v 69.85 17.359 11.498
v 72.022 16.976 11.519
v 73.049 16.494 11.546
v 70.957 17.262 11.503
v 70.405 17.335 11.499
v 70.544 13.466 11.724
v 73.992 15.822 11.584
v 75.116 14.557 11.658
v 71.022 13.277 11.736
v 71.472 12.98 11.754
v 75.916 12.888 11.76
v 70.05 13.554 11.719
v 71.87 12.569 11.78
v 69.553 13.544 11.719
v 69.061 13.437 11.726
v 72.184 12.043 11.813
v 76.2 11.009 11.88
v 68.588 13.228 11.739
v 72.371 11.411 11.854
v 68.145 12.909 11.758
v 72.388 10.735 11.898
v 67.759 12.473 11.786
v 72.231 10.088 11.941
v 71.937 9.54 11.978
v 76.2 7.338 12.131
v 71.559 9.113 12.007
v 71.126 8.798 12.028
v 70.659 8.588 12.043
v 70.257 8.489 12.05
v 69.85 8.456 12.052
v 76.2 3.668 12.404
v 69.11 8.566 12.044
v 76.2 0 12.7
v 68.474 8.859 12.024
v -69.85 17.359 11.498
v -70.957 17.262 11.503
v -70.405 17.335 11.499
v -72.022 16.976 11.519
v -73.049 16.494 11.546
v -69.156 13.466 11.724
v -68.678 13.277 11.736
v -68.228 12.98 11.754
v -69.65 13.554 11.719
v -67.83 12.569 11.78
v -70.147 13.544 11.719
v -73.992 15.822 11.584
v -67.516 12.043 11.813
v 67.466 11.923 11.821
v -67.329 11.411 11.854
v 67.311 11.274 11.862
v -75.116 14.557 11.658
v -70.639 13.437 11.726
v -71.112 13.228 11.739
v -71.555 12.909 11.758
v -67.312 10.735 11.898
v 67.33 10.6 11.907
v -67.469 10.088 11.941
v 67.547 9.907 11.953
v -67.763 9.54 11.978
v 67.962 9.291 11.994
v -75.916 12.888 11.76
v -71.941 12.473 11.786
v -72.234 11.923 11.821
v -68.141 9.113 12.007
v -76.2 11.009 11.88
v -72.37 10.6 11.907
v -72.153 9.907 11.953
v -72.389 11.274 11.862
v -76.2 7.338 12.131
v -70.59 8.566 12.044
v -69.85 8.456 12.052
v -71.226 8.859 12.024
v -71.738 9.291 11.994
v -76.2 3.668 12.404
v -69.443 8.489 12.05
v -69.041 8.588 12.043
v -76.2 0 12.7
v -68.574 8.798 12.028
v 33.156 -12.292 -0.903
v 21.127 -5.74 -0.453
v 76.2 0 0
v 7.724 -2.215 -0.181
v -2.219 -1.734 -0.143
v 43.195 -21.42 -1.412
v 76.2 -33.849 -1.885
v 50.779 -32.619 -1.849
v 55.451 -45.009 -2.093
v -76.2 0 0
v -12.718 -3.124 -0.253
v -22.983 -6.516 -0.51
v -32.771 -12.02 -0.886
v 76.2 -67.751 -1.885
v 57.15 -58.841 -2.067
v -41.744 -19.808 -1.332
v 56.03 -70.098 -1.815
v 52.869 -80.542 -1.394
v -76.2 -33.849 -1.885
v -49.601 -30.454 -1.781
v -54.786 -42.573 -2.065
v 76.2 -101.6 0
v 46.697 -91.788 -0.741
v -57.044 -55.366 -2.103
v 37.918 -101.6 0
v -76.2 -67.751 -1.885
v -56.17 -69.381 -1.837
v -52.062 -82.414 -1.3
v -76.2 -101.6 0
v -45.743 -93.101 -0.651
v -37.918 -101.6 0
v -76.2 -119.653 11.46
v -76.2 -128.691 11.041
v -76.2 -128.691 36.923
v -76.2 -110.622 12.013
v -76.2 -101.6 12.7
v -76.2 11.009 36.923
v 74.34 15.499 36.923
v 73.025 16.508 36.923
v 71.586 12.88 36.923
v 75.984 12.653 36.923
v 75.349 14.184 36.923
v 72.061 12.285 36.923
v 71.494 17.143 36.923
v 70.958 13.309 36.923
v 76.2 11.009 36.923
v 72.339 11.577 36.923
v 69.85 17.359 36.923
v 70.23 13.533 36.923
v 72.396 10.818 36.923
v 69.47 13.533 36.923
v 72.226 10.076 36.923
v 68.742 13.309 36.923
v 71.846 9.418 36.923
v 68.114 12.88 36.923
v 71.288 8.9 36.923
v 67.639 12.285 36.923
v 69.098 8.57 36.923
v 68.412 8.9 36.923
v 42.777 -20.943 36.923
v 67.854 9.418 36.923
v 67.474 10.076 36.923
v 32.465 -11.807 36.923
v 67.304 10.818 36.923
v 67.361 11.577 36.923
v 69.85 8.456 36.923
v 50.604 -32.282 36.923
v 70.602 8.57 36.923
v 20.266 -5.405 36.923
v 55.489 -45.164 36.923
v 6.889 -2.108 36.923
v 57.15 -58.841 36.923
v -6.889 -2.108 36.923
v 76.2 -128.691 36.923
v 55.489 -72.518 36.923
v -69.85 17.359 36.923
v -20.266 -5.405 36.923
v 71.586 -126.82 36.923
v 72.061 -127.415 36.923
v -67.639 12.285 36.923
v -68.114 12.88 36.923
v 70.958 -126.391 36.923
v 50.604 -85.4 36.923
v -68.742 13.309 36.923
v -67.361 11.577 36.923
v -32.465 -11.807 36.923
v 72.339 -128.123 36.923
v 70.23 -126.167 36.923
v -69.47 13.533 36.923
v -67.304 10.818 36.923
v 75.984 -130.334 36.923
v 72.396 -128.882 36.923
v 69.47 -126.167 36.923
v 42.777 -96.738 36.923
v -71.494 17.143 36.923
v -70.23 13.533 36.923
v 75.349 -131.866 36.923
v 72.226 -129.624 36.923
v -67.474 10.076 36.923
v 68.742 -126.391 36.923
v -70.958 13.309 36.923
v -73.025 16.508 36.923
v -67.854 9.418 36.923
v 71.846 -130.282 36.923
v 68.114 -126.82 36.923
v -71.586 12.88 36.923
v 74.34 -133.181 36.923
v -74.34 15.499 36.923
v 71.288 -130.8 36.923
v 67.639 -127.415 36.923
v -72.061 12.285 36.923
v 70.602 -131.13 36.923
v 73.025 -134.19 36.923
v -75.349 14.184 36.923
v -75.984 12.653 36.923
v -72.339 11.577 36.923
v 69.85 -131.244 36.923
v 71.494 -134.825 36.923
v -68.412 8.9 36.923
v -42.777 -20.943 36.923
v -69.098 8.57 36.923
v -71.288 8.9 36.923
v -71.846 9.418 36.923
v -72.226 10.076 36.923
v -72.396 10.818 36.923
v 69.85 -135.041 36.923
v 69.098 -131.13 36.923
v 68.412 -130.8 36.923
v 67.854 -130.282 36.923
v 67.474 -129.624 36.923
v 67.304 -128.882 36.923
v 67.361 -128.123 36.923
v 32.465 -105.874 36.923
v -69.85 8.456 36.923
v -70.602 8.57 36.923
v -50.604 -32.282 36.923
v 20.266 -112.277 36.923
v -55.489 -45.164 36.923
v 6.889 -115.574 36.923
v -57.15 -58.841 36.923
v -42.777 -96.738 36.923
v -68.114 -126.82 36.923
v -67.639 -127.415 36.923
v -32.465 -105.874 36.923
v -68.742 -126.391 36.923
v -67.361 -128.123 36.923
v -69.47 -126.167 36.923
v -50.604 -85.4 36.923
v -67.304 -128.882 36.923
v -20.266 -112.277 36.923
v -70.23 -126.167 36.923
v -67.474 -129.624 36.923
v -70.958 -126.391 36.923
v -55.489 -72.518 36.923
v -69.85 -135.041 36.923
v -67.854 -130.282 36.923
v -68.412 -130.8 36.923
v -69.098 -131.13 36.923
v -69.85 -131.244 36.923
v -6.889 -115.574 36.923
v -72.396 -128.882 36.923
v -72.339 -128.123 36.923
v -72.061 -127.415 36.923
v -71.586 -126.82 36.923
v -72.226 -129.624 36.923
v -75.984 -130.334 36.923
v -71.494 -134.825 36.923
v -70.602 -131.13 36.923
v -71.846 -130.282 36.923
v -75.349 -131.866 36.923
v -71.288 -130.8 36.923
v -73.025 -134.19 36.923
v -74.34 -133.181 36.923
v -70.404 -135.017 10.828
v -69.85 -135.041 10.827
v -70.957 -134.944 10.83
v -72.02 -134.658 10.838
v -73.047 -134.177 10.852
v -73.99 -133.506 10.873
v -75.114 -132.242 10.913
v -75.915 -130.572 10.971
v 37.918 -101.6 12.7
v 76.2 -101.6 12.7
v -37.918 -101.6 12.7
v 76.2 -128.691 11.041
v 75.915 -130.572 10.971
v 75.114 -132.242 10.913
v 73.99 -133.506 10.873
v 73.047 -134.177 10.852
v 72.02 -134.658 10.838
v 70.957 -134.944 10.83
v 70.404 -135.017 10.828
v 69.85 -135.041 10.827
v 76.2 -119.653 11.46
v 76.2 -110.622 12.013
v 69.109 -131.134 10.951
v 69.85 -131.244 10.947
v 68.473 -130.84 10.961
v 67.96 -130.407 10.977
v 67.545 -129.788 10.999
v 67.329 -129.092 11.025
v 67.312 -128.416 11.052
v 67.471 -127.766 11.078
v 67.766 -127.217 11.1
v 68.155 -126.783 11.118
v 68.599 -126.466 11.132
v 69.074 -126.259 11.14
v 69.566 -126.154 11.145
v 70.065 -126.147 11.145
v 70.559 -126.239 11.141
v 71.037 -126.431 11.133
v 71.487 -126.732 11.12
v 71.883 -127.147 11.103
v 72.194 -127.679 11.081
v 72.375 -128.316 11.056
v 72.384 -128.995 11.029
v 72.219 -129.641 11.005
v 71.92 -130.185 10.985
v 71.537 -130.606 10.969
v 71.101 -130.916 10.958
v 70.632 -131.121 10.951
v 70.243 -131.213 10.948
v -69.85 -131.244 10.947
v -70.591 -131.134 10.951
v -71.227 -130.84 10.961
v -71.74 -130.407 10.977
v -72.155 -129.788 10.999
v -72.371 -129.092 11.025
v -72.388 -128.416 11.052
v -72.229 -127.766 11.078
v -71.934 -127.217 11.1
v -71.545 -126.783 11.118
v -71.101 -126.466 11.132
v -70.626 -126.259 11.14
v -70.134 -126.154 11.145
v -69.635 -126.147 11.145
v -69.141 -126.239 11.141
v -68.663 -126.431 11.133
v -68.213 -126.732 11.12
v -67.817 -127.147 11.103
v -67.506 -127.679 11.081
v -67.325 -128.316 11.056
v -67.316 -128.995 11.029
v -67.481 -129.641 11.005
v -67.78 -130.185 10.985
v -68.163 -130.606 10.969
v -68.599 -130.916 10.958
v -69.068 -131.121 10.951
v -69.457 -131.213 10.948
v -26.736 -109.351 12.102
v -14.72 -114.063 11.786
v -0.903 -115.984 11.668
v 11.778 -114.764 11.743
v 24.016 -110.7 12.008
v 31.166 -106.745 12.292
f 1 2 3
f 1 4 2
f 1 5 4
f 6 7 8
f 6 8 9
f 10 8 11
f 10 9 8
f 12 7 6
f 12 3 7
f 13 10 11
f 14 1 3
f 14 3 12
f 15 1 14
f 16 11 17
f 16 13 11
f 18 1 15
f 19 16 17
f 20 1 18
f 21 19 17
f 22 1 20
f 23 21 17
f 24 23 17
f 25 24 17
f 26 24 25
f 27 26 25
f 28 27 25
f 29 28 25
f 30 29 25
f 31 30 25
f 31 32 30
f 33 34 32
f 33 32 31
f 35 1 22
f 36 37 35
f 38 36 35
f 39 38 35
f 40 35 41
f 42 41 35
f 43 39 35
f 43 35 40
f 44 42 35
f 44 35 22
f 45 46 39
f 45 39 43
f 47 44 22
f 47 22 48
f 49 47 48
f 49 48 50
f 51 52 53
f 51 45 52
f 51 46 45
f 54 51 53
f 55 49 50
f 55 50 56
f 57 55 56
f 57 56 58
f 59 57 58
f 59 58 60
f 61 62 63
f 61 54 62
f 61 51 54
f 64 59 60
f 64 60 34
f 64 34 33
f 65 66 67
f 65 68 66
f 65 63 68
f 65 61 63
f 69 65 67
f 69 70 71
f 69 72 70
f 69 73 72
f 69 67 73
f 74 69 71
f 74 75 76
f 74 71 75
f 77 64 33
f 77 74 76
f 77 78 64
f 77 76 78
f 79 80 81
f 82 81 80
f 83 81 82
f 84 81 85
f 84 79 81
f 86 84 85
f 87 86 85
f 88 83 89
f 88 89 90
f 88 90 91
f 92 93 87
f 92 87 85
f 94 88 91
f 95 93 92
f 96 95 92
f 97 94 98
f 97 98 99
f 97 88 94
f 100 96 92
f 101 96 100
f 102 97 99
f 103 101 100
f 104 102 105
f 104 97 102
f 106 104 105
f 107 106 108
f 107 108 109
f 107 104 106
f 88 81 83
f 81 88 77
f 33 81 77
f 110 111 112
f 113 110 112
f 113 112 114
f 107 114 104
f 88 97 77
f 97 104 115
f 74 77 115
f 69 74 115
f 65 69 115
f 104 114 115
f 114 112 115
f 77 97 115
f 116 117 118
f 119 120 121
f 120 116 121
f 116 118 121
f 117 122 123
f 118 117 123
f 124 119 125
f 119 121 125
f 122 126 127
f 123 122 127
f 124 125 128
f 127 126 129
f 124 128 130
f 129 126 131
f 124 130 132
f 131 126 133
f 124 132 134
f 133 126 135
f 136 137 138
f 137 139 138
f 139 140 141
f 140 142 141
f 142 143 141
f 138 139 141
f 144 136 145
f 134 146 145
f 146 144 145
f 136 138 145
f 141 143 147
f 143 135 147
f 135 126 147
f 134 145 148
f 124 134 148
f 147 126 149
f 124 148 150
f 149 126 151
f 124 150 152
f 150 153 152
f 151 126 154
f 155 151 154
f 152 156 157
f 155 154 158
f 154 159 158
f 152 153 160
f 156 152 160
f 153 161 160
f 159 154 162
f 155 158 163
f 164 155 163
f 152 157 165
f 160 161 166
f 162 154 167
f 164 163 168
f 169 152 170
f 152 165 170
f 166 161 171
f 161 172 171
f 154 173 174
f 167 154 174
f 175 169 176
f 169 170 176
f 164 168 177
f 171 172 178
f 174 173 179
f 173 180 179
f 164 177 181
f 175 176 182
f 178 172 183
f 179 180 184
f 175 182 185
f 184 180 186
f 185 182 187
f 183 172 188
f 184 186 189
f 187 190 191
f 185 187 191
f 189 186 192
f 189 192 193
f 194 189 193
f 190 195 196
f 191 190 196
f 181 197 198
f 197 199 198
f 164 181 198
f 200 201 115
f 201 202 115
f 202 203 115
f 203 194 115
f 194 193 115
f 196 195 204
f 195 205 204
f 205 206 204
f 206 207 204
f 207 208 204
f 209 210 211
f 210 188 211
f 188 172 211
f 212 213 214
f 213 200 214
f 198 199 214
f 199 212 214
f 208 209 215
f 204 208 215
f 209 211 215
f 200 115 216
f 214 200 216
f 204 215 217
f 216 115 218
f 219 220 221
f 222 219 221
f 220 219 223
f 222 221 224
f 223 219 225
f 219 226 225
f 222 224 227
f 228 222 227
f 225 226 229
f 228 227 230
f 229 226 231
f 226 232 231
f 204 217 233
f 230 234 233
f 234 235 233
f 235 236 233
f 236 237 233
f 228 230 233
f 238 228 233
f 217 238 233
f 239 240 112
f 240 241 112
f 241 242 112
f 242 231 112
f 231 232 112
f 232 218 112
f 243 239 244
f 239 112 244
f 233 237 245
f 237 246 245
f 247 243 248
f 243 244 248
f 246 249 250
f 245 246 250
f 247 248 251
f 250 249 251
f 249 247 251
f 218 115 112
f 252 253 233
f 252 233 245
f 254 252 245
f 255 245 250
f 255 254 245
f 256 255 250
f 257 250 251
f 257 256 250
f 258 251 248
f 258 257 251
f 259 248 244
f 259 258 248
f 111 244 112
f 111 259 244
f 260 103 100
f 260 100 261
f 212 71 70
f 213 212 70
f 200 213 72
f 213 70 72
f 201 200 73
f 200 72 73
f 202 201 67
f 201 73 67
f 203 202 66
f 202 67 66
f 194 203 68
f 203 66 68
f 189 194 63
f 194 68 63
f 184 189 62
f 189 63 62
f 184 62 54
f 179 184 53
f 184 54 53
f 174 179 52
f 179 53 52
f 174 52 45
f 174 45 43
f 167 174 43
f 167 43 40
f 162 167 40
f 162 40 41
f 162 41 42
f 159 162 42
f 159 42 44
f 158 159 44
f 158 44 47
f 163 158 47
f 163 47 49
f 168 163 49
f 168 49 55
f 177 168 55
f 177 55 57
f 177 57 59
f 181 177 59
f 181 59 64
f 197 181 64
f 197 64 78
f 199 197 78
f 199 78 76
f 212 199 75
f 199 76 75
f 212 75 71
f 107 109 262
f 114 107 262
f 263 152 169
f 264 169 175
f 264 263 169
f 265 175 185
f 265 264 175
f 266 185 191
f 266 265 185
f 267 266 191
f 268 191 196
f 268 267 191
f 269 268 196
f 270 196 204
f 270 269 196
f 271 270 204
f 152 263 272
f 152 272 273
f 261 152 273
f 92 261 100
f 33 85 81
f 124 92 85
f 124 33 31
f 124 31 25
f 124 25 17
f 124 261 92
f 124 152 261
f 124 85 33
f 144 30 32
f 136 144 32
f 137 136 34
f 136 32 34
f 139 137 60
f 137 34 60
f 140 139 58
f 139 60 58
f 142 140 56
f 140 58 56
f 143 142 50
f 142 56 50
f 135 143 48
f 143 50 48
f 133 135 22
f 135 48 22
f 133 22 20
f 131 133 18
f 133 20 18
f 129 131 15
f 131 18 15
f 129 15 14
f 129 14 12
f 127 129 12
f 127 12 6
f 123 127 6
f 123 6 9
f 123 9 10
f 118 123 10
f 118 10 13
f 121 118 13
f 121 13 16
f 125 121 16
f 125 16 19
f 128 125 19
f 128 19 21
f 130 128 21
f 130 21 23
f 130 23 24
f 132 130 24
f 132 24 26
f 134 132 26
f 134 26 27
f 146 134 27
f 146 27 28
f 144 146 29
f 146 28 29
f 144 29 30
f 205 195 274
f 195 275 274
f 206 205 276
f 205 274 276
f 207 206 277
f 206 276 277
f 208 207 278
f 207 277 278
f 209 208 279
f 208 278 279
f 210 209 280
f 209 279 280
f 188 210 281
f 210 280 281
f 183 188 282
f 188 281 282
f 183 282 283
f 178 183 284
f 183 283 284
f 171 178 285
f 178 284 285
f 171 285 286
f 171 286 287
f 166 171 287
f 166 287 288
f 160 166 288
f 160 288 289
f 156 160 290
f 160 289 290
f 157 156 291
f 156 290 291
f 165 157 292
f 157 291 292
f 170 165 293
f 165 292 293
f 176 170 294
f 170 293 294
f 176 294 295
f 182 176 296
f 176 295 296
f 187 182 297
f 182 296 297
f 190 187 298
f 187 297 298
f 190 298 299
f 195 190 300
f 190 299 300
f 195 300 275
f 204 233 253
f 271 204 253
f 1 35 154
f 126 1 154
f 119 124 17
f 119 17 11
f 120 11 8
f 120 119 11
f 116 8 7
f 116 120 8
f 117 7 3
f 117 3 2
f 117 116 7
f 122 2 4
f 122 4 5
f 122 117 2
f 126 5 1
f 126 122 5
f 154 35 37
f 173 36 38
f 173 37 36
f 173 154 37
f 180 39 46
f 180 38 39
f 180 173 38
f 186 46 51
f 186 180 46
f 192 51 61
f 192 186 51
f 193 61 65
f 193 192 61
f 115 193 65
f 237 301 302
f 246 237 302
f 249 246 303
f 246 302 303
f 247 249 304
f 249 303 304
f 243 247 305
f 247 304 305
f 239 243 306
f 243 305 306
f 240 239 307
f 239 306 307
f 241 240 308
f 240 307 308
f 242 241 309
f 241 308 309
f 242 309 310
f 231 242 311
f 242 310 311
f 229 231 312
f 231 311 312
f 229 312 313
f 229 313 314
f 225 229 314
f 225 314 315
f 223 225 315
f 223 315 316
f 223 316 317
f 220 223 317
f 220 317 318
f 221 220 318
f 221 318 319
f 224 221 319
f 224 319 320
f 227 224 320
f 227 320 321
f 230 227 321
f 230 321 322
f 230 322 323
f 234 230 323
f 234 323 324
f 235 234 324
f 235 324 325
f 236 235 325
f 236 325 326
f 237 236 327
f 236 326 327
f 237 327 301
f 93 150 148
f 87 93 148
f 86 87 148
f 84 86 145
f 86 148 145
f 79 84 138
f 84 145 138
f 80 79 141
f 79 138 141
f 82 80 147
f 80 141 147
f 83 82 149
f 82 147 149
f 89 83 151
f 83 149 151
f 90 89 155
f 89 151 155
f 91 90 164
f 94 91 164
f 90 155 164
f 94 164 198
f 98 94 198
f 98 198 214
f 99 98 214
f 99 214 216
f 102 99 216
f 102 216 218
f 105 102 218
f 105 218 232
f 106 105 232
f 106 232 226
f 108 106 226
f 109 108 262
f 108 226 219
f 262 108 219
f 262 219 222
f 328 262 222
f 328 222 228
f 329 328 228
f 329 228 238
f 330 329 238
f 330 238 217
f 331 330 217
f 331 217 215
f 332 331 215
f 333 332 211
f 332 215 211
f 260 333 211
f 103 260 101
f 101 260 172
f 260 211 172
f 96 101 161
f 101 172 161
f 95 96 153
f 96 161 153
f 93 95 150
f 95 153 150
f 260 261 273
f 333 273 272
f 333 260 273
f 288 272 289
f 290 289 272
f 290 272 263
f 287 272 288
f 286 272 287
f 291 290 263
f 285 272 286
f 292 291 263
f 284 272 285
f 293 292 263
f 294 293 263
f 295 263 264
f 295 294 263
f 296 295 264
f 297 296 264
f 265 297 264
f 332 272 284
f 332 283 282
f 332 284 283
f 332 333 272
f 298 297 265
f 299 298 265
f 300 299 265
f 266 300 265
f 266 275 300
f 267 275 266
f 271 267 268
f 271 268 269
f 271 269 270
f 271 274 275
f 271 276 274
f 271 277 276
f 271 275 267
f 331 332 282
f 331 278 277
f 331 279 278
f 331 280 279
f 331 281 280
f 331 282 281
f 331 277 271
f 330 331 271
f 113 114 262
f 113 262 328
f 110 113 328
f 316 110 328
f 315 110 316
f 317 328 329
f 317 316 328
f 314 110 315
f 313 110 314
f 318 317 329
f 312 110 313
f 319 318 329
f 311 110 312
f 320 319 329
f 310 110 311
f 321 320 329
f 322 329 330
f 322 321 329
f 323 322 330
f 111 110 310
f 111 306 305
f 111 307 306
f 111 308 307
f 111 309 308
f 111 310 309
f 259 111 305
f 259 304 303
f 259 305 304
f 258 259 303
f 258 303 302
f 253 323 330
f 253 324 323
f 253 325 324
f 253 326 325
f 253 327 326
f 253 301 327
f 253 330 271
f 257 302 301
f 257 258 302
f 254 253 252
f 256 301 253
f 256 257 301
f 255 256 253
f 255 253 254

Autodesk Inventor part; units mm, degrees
ref_plane "YZ Plane" through (0, 0, 0) normal (1, 0, 0) x (0, 1, 0)
ref_plane "XZ Plane" through (0, 0, 0) normal (0, 1, 0) x (-1, 0, 0)
ref_plane "XY Plane" through (0, 0, 0) normal (0, 0, 1) x (1, 0, 0)
sketch "Sketch1" plane through (0, 0, 0) normal (1, 0, 0) x (0, 1, 0)
  line L0 (0, 0) -> (0, 12.7)
  line L1 (0, 0) -> (-101.6, 0) construction
  arc A0 (-101.6, 0) -> (0, 0) centre (-50.8, 607.4796) ccw
  line L2 (-50.8, -2.1204) -> (-50.8, 0) construction
  line L3 (0, 12.7) -> (101.6, 12.7) construction
  arc A1 (0, 12.7) -> (101.6, 12.7) centre (50.8, 620.1796) ccw
  line L4 (-101.6, 0) -> (-101.6, 12.7)
  line L5 (-101.6, 12.7) -> (-203.2, 12.7) construction
  arc A2 (-203.2, 12.7) -> (-101.6, 12.7) centre (-152.4, 620.1796) ccw
  line L6 (17.3591, 11.4976) -> (17.3591, 36.923)
  line L7 (17.3591, 36.923) -> (-135.0409, 36.923)
  line L8 (-135.0409, 36.923) -> (-135.0409, 10.8269)
  dimension "d0" = 12.7
  dimension "d1" = 101.6
  dimension "d3" = 50.8
  dimension "d4" = 2.1204
  dimension "d5" = 609.6
  dimension "d6" = 101.6
  dimension "d7" = 609.6
  dimension "d8" = 12.7
  dimension "d9" = 101.6
  dimension "d10" = 609.6
  dimension "d11" = 152.4
  dimension "d12" = 25.4254
extrude "Extrusion1" add sketch "Sketch1" along normal mid plane 152.4
sketch "Sketch3" plane through (-76.2, -135.0409, 36.923) normal (0, 0, 1) x (1, 0, 0)
  line L0 (0, 0) -> (0, 152.4) construction
  line L1 (152.4, 152.4) -> (152.4, 0) construction
  line L2 (0, 152.4) -> (152.4, 0) construction
  line L3 (152.4, 0) -> (0, 0) construction
  line L4 (152.4, 135.0409) -> (152.4, 152.4) construction
  line L5 (0, 0) -> (152.4, 152.4) construction
  circle A0 centre (76.2, 76.2) radius 57.15
  line L6 (6.35, 6.35) -> (146.05, 6.35) construction
  line L7 (146.05, 6.35) -> (146.05, 146.05) construction
  line L8 (146.05, 146.05) -> (6.35, 146.05) construction
  line L9 (6.35, 146.05) -> (6.35, 6.35) construction
  line L10 (6.35, 6.35) -> (146.05, 146.05) construction
  line L11 (146.05, 6.35) -> (6.35, 146.05) construction
  line L12 (0, 152.4) -> (152.4, 152.4) construction
  point P0 (76.2, 135.0409)
  dimension "d15" = 114.3
  dimension "d16" = 6.35
  dimension "d17" = 6.35
extrude "Extrusion2" cut sketch "Sketch3" against normal through all
hole "Hole1" at (-69.85, 11.0091, 36.923) at (69.85, 11.0091, 36.923) at (69.85, -128.6909, 36.923) at (-69.85, -128.6909, 36.923) direction (0, 0, -1) diameter 5.1054 end through all clearance for "Hex Machine Screw" size "#10" standard "Ansi Unified Screw Threads"
fillet "Fillet1" radius 6.35 4 edges at (-76.2, 17.3591, 24.2103) (76.2, 17.3591, 24.2103) (76.2, -135.0409, 23.8749) (-76.2, -135.0409, 23.8749)
equation "\"d0\" = sidingDepth"
equation "\"d1\" = sidingHeight"
equation "\"d5\" = radiusOfCurvature"
equation "\"d6\" = sidingHeight"
equation "\"d7\" = radiusOfCurvature"
equation "\"d11\" = outsideWidthOfVent"
equation "\"d13\" = outsideWidthOfVent"
equation "\"d15\" = ventHole"
equation "\"d27\" = ventRadius"
equation "\"sidingHeight\" = 101.6"
equation "\"sidingDepth\" = 12.7"
equation "\"radiusOfCurvature\" = 609.6"
equation "\"outsideWidthOfVent\" = 152.4"
equation "\"wallThicknessOfVent\" = 19.05"
equation "\"holeOffset\" = 6.35"
equation "\"ventHole\" = 114.3"
equation "\"ventRadius\" = 6.35"
properties part number "ventForDryer"
